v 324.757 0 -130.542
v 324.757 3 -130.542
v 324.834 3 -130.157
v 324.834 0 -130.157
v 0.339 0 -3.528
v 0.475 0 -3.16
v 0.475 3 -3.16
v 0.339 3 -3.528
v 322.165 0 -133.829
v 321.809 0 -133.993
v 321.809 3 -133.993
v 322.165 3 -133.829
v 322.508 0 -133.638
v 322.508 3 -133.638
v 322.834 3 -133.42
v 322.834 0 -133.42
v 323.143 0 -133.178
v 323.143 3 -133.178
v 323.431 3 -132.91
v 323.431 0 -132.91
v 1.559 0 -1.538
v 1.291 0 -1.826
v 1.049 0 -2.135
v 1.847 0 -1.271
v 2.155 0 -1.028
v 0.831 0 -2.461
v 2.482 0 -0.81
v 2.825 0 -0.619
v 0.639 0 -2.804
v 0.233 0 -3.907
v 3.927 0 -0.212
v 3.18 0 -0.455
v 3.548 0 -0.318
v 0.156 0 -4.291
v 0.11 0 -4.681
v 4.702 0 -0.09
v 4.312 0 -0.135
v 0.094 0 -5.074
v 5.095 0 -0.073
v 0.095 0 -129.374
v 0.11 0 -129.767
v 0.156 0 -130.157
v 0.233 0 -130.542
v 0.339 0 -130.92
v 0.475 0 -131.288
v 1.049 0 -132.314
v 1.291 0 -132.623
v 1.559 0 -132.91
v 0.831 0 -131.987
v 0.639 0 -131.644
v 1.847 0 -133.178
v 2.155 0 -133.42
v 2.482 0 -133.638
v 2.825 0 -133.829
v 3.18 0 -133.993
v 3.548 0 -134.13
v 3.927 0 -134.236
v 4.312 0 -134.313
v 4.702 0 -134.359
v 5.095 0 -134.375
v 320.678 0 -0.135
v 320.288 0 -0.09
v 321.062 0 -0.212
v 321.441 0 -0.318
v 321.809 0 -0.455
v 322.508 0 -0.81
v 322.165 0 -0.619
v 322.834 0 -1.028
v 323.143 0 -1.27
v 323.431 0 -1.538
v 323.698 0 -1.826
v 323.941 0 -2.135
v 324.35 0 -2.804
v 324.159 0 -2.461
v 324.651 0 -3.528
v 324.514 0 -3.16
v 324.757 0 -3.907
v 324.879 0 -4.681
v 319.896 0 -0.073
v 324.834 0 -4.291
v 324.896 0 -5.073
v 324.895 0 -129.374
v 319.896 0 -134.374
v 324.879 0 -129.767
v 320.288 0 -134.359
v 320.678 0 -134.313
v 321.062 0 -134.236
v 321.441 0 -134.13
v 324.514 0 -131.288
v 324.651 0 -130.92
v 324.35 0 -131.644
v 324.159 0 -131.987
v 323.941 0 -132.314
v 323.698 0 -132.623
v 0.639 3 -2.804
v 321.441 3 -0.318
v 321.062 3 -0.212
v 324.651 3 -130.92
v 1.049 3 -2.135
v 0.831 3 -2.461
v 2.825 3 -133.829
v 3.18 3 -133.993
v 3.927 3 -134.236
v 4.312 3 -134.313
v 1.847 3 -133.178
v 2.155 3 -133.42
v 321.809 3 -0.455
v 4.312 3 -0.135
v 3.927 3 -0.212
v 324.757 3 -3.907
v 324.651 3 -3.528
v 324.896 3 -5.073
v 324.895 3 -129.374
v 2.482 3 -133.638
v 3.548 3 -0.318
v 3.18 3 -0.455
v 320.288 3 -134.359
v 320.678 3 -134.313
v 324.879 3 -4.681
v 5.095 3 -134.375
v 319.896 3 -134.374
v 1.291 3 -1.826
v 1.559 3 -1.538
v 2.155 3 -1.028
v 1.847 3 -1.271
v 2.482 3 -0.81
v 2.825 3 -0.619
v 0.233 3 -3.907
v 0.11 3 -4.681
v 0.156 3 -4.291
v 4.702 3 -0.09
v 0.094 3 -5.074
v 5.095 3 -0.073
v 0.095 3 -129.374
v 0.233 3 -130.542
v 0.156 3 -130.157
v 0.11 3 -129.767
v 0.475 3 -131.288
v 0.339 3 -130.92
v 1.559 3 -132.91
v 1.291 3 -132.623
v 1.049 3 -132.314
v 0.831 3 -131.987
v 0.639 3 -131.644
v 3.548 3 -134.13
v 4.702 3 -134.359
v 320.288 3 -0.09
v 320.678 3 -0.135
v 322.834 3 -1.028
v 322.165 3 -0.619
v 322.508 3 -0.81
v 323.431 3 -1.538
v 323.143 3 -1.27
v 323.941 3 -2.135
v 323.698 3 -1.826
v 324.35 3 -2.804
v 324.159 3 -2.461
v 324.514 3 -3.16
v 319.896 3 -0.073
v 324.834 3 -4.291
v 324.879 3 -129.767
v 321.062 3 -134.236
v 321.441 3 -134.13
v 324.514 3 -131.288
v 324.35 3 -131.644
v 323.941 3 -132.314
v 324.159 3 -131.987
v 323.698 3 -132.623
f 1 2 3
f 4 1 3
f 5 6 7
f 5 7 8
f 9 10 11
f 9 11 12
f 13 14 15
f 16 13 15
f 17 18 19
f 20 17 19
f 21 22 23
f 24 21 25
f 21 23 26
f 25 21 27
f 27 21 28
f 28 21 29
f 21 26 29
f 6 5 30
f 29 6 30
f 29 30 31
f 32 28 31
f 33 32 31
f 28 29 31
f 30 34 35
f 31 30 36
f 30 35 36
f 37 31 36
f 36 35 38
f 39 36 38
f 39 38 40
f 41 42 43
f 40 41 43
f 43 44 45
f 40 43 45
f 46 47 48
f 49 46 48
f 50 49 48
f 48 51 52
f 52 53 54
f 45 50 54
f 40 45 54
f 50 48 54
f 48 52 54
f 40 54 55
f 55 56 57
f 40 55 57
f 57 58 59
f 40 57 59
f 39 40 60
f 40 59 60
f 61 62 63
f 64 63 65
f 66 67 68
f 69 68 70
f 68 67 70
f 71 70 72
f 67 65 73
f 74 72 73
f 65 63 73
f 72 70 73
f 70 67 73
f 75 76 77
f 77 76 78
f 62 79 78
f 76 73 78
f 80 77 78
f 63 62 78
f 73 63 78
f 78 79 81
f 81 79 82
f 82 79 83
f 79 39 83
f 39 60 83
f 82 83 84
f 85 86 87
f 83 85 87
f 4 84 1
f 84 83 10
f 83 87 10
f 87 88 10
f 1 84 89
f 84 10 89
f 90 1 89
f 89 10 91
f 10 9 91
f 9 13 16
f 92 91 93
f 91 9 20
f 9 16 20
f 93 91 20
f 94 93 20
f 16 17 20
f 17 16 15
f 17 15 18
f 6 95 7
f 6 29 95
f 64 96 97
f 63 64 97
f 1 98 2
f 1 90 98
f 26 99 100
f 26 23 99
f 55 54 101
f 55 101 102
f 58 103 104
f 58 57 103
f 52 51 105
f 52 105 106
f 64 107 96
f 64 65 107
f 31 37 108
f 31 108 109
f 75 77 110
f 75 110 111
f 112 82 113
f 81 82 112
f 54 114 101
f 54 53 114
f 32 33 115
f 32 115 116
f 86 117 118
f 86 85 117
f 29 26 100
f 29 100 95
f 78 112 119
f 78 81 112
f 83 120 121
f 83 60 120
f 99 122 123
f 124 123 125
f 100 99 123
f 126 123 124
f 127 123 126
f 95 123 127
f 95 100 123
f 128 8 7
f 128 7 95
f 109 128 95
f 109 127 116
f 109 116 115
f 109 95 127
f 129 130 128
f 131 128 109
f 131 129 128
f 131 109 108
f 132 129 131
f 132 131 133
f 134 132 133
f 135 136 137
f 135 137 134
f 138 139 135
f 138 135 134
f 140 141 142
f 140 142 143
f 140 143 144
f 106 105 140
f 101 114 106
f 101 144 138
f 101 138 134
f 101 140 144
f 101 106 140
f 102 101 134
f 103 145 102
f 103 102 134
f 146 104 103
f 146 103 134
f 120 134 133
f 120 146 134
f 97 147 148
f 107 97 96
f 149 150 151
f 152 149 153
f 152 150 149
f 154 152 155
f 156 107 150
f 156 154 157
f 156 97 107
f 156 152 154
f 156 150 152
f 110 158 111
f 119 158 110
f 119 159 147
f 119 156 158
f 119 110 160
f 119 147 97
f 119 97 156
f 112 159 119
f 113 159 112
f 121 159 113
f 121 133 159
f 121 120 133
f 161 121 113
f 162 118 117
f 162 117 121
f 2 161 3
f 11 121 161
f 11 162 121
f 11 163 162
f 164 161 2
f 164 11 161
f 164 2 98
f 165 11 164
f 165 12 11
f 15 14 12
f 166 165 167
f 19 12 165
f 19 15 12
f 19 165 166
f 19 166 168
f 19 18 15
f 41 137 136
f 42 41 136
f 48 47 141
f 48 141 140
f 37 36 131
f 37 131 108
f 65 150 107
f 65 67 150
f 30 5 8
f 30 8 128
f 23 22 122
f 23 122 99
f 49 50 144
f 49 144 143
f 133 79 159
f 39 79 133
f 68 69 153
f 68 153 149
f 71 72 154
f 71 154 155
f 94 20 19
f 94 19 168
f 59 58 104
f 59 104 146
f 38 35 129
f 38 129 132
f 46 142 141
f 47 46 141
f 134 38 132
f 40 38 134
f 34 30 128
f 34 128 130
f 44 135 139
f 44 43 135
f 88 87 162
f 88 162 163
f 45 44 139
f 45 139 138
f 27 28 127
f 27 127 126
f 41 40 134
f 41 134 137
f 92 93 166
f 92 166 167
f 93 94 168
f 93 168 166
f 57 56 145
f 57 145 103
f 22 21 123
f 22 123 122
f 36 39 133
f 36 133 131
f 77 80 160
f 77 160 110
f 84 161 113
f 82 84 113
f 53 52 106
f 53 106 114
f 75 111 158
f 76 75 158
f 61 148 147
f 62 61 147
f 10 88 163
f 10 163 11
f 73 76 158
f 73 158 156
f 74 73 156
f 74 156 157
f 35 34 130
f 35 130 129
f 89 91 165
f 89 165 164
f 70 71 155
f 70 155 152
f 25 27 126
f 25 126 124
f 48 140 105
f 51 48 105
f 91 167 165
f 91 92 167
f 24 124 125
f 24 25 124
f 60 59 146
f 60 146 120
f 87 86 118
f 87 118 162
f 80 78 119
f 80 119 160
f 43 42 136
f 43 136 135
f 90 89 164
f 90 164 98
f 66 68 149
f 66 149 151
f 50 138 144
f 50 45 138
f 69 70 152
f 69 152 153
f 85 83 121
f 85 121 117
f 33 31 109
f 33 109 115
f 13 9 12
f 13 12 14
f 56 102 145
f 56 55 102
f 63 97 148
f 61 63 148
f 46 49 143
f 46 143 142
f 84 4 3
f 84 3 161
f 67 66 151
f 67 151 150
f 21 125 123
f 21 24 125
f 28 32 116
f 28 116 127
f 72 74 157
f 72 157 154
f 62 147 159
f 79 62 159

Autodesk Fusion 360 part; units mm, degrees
sketch "Sketch1" plane through (0, 0, 0) normal (0, 1, 0) x (1, 0, 0)
sketch "Sketch2" plane through (0, 0, 0) normal (0, 1, 0) x (1, 0, 0)
  line L0 (0.4754, 3.1598) -> (0.339, 3.5278)
  line L1 (0.1557, 4.2912) -> (0.1102, 4.6812)
  line L2 (321.809, 133.993) -> (322.165, 133.829)
  line L3 (322.165, 133.829) -> (322.508, 133.638)
  line L4 (323.698, 1.8259) -> (323.431, 1.5379)
  line L5 (324.757, 3.9067) -> (324.651, 3.5278)
  line L6 (324.159, 2.4612) -> (323.941, 2.1346)
  line L7 (3.1805, 0.4548) -> (2.825, 0.6187)
  line L8 (4.7019, 0.0896) -> (4.3119, 0.135)
  line L9 (319.896, 134.374) -> (320.288, 134.359)
  line L10 (324.879, 4.6812) -> (324.834, 4.2912)
  line L11 (323.941, 132.314) -> (324.159, 131.987)
  line L12 (324.651, 3.5278) -> (324.514, 3.1598)
  line L13 (2.1553, 1.028) -> (1.8466, 1.2706)
  line L14 (319.896, 0.073) -> (5.0946, 0.073)
  line L15 (0.6394, 2.8043) -> (0.4754, 3.1598)
  line L16 (0.2329, 3.9067) -> (0.1557, 4.2912)
  line L17 (0.339, 3.5278) -> (0.2329, 3.9067)
  line L18 (2.825, 0.6187) -> (2.4819, 0.8103)
  line L19 (4.3119, 0.135) -> (3.9274, 0.2122)
  line L20 (324.834, 130.157) -> (324.879, 129.767)
  line L21 (1.2912, 1.8259) -> (1.0487, 2.1346)
  line L22 (322.834, 1.028) -> (322.508, 0.8103)
  line L23 (321.441, 0.3183) -> (321.062, 0.2122)
  line L24 (323.698, 132.623) -> (323.941, 132.314)
  line L25 (0.831, 2.4612) -> (0.6394, 2.8043)
  line L26 (320.288, 134.359) -> (320.678, 134.313)
  line L27 (1.8466, 1.2706) -> (1.5586, 1.5379)
  line L28 (1.5586, 1.5379) -> (1.2912, 1.8259)
  line L29 (0.0937, 5.0739) -> (0.0951, 129.374)
  line L30 (1.0487, 132.314) -> (1.2912, 132.623)
  line L31 (0.4754, 131.288) -> (0.6394, 131.644)
  line L32 (320.678, 134.313) -> (321.062, 134.236)
  line L33 (0.831, 131.987) -> (1.0487, 132.314)
  line L34 (3.9274, 134.236) -> (4.3119, 134.313)
  line L35 (324.159, 131.987) -> (324.35, 131.644)
  line L36 (3.1805, 133.993) -> (3.5485, 134.13)
  line L37 (3.9274, 0.2122) -> (3.5485, 0.3183)
  line L38 (324.514, 3.1598) -> (324.35, 2.8043)
  line L39 (324.35, 2.8043) -> (324.159, 2.4612)
  line L40 (322.508, 0.8103) -> (322.165, 0.6187)
  line L41 (5.0946, 0.073) -> (4.7019, 0.0896)
  line L42 (324.651, 130.92) -> (324.757, 130.542)
  line L43 (3.5485, 0.3183) -> (3.1805, 0.4548)
  line L44 (324.514, 131.288) -> (324.651, 130.92)
  line L45 (320.678, 0.135) -> (320.288, 0.0896)
  line L46 (1.5586, 132.91) -> (1.8466, 133.178)
  line L47 (0.1102, 4.6812) -> (0.0937, 5.0739)
  line L48 (322.508, 133.638) -> (322.834, 133.42)
  line L49 (5.0946, 134.375) -> (319.896, 134.374)
  line L50 (321.809, 0.4548) -> (321.441, 0.3183)
  line L51 (324.895, 129.374) -> (324.896, 5.0726)
  line L52 (323.431, 1.5379) -> (323.143, 1.2705)
  line L53 (322.165, 0.6187) -> (321.809, 0.4548)
  line L54 (323.941, 2.1346) -> (323.698, 1.8259)
  line L55 (324.896, 5.0726) -> (324.879, 4.6812)
  line L56 (322.834, 133.42) -> (323.143, 133.178)
  line L57 (323.431, 132.91) -> (323.698, 132.623)
  line L58 (324.35, 131.644) -> (324.514, 131.288)
  line L59 (324.757, 130.542) -> (324.834, 130.157)
  line L60 (321.062, 0.2122) -> (320.678, 0.135)
  line L61 (2.4819, 0.8103) -> (2.1553, 1.028)
  line L62 (0.1102, 129.767) -> (0.1557, 130.157)
  line L63 (321.441, 134.13) -> (321.809, 133.993)
  line L64 (324.879, 129.767) -> (324.895, 129.374)
  line L65 (1.0487, 2.1346) -> (0.831, 2.4612)
  line L66 (0.0951, 129.374) -> (0.1102, 129.767)
  line L67 (324.834, 4.2912) -> (324.757, 3.9067)
  line L68 (4.3119, 134.313) -> (4.7019, 134.359)
  line L69 (0.339, 130.92) -> (0.4754, 131.288)
  line L70 (1.2912, 132.623) -> (1.5586, 132.91)
  line L71 (0.2329, 130.542) -> (0.339, 130.92)
  line L72 (0.6394, 131.644) -> (0.831, 131.987)
  line L73 (2.4819, 133.638) -> (2.825, 133.829)
  line L74 (4.7019, 134.359) -> (5.0946, 134.375)
  line L75 (323.143, 133.178) -> (323.431, 132.91)
  line L76 (323.143, 1.2706) -> (322.834, 1.028)
  line L77 (320.288, 0.0896) -> (319.896, 0.073)
  line L78 (321.062, 134.236) -> (321.441, 134.13)
  line L79 (1.8466, 133.178) -> (2.1553, 133.42)
  line L80 (0.1557, 130.157) -> (0.2329, 130.542)
  line L81 (3.5485, 134.13) -> (3.9274, 134.236)
  line L82 (2.825, 133.829) -> (3.1805, 133.993)
  line L83 (2.1553, 133.42) -> (2.4819, 133.638)
extrude "Extrude1" add sketch "Sketch2" along normal blind 3
